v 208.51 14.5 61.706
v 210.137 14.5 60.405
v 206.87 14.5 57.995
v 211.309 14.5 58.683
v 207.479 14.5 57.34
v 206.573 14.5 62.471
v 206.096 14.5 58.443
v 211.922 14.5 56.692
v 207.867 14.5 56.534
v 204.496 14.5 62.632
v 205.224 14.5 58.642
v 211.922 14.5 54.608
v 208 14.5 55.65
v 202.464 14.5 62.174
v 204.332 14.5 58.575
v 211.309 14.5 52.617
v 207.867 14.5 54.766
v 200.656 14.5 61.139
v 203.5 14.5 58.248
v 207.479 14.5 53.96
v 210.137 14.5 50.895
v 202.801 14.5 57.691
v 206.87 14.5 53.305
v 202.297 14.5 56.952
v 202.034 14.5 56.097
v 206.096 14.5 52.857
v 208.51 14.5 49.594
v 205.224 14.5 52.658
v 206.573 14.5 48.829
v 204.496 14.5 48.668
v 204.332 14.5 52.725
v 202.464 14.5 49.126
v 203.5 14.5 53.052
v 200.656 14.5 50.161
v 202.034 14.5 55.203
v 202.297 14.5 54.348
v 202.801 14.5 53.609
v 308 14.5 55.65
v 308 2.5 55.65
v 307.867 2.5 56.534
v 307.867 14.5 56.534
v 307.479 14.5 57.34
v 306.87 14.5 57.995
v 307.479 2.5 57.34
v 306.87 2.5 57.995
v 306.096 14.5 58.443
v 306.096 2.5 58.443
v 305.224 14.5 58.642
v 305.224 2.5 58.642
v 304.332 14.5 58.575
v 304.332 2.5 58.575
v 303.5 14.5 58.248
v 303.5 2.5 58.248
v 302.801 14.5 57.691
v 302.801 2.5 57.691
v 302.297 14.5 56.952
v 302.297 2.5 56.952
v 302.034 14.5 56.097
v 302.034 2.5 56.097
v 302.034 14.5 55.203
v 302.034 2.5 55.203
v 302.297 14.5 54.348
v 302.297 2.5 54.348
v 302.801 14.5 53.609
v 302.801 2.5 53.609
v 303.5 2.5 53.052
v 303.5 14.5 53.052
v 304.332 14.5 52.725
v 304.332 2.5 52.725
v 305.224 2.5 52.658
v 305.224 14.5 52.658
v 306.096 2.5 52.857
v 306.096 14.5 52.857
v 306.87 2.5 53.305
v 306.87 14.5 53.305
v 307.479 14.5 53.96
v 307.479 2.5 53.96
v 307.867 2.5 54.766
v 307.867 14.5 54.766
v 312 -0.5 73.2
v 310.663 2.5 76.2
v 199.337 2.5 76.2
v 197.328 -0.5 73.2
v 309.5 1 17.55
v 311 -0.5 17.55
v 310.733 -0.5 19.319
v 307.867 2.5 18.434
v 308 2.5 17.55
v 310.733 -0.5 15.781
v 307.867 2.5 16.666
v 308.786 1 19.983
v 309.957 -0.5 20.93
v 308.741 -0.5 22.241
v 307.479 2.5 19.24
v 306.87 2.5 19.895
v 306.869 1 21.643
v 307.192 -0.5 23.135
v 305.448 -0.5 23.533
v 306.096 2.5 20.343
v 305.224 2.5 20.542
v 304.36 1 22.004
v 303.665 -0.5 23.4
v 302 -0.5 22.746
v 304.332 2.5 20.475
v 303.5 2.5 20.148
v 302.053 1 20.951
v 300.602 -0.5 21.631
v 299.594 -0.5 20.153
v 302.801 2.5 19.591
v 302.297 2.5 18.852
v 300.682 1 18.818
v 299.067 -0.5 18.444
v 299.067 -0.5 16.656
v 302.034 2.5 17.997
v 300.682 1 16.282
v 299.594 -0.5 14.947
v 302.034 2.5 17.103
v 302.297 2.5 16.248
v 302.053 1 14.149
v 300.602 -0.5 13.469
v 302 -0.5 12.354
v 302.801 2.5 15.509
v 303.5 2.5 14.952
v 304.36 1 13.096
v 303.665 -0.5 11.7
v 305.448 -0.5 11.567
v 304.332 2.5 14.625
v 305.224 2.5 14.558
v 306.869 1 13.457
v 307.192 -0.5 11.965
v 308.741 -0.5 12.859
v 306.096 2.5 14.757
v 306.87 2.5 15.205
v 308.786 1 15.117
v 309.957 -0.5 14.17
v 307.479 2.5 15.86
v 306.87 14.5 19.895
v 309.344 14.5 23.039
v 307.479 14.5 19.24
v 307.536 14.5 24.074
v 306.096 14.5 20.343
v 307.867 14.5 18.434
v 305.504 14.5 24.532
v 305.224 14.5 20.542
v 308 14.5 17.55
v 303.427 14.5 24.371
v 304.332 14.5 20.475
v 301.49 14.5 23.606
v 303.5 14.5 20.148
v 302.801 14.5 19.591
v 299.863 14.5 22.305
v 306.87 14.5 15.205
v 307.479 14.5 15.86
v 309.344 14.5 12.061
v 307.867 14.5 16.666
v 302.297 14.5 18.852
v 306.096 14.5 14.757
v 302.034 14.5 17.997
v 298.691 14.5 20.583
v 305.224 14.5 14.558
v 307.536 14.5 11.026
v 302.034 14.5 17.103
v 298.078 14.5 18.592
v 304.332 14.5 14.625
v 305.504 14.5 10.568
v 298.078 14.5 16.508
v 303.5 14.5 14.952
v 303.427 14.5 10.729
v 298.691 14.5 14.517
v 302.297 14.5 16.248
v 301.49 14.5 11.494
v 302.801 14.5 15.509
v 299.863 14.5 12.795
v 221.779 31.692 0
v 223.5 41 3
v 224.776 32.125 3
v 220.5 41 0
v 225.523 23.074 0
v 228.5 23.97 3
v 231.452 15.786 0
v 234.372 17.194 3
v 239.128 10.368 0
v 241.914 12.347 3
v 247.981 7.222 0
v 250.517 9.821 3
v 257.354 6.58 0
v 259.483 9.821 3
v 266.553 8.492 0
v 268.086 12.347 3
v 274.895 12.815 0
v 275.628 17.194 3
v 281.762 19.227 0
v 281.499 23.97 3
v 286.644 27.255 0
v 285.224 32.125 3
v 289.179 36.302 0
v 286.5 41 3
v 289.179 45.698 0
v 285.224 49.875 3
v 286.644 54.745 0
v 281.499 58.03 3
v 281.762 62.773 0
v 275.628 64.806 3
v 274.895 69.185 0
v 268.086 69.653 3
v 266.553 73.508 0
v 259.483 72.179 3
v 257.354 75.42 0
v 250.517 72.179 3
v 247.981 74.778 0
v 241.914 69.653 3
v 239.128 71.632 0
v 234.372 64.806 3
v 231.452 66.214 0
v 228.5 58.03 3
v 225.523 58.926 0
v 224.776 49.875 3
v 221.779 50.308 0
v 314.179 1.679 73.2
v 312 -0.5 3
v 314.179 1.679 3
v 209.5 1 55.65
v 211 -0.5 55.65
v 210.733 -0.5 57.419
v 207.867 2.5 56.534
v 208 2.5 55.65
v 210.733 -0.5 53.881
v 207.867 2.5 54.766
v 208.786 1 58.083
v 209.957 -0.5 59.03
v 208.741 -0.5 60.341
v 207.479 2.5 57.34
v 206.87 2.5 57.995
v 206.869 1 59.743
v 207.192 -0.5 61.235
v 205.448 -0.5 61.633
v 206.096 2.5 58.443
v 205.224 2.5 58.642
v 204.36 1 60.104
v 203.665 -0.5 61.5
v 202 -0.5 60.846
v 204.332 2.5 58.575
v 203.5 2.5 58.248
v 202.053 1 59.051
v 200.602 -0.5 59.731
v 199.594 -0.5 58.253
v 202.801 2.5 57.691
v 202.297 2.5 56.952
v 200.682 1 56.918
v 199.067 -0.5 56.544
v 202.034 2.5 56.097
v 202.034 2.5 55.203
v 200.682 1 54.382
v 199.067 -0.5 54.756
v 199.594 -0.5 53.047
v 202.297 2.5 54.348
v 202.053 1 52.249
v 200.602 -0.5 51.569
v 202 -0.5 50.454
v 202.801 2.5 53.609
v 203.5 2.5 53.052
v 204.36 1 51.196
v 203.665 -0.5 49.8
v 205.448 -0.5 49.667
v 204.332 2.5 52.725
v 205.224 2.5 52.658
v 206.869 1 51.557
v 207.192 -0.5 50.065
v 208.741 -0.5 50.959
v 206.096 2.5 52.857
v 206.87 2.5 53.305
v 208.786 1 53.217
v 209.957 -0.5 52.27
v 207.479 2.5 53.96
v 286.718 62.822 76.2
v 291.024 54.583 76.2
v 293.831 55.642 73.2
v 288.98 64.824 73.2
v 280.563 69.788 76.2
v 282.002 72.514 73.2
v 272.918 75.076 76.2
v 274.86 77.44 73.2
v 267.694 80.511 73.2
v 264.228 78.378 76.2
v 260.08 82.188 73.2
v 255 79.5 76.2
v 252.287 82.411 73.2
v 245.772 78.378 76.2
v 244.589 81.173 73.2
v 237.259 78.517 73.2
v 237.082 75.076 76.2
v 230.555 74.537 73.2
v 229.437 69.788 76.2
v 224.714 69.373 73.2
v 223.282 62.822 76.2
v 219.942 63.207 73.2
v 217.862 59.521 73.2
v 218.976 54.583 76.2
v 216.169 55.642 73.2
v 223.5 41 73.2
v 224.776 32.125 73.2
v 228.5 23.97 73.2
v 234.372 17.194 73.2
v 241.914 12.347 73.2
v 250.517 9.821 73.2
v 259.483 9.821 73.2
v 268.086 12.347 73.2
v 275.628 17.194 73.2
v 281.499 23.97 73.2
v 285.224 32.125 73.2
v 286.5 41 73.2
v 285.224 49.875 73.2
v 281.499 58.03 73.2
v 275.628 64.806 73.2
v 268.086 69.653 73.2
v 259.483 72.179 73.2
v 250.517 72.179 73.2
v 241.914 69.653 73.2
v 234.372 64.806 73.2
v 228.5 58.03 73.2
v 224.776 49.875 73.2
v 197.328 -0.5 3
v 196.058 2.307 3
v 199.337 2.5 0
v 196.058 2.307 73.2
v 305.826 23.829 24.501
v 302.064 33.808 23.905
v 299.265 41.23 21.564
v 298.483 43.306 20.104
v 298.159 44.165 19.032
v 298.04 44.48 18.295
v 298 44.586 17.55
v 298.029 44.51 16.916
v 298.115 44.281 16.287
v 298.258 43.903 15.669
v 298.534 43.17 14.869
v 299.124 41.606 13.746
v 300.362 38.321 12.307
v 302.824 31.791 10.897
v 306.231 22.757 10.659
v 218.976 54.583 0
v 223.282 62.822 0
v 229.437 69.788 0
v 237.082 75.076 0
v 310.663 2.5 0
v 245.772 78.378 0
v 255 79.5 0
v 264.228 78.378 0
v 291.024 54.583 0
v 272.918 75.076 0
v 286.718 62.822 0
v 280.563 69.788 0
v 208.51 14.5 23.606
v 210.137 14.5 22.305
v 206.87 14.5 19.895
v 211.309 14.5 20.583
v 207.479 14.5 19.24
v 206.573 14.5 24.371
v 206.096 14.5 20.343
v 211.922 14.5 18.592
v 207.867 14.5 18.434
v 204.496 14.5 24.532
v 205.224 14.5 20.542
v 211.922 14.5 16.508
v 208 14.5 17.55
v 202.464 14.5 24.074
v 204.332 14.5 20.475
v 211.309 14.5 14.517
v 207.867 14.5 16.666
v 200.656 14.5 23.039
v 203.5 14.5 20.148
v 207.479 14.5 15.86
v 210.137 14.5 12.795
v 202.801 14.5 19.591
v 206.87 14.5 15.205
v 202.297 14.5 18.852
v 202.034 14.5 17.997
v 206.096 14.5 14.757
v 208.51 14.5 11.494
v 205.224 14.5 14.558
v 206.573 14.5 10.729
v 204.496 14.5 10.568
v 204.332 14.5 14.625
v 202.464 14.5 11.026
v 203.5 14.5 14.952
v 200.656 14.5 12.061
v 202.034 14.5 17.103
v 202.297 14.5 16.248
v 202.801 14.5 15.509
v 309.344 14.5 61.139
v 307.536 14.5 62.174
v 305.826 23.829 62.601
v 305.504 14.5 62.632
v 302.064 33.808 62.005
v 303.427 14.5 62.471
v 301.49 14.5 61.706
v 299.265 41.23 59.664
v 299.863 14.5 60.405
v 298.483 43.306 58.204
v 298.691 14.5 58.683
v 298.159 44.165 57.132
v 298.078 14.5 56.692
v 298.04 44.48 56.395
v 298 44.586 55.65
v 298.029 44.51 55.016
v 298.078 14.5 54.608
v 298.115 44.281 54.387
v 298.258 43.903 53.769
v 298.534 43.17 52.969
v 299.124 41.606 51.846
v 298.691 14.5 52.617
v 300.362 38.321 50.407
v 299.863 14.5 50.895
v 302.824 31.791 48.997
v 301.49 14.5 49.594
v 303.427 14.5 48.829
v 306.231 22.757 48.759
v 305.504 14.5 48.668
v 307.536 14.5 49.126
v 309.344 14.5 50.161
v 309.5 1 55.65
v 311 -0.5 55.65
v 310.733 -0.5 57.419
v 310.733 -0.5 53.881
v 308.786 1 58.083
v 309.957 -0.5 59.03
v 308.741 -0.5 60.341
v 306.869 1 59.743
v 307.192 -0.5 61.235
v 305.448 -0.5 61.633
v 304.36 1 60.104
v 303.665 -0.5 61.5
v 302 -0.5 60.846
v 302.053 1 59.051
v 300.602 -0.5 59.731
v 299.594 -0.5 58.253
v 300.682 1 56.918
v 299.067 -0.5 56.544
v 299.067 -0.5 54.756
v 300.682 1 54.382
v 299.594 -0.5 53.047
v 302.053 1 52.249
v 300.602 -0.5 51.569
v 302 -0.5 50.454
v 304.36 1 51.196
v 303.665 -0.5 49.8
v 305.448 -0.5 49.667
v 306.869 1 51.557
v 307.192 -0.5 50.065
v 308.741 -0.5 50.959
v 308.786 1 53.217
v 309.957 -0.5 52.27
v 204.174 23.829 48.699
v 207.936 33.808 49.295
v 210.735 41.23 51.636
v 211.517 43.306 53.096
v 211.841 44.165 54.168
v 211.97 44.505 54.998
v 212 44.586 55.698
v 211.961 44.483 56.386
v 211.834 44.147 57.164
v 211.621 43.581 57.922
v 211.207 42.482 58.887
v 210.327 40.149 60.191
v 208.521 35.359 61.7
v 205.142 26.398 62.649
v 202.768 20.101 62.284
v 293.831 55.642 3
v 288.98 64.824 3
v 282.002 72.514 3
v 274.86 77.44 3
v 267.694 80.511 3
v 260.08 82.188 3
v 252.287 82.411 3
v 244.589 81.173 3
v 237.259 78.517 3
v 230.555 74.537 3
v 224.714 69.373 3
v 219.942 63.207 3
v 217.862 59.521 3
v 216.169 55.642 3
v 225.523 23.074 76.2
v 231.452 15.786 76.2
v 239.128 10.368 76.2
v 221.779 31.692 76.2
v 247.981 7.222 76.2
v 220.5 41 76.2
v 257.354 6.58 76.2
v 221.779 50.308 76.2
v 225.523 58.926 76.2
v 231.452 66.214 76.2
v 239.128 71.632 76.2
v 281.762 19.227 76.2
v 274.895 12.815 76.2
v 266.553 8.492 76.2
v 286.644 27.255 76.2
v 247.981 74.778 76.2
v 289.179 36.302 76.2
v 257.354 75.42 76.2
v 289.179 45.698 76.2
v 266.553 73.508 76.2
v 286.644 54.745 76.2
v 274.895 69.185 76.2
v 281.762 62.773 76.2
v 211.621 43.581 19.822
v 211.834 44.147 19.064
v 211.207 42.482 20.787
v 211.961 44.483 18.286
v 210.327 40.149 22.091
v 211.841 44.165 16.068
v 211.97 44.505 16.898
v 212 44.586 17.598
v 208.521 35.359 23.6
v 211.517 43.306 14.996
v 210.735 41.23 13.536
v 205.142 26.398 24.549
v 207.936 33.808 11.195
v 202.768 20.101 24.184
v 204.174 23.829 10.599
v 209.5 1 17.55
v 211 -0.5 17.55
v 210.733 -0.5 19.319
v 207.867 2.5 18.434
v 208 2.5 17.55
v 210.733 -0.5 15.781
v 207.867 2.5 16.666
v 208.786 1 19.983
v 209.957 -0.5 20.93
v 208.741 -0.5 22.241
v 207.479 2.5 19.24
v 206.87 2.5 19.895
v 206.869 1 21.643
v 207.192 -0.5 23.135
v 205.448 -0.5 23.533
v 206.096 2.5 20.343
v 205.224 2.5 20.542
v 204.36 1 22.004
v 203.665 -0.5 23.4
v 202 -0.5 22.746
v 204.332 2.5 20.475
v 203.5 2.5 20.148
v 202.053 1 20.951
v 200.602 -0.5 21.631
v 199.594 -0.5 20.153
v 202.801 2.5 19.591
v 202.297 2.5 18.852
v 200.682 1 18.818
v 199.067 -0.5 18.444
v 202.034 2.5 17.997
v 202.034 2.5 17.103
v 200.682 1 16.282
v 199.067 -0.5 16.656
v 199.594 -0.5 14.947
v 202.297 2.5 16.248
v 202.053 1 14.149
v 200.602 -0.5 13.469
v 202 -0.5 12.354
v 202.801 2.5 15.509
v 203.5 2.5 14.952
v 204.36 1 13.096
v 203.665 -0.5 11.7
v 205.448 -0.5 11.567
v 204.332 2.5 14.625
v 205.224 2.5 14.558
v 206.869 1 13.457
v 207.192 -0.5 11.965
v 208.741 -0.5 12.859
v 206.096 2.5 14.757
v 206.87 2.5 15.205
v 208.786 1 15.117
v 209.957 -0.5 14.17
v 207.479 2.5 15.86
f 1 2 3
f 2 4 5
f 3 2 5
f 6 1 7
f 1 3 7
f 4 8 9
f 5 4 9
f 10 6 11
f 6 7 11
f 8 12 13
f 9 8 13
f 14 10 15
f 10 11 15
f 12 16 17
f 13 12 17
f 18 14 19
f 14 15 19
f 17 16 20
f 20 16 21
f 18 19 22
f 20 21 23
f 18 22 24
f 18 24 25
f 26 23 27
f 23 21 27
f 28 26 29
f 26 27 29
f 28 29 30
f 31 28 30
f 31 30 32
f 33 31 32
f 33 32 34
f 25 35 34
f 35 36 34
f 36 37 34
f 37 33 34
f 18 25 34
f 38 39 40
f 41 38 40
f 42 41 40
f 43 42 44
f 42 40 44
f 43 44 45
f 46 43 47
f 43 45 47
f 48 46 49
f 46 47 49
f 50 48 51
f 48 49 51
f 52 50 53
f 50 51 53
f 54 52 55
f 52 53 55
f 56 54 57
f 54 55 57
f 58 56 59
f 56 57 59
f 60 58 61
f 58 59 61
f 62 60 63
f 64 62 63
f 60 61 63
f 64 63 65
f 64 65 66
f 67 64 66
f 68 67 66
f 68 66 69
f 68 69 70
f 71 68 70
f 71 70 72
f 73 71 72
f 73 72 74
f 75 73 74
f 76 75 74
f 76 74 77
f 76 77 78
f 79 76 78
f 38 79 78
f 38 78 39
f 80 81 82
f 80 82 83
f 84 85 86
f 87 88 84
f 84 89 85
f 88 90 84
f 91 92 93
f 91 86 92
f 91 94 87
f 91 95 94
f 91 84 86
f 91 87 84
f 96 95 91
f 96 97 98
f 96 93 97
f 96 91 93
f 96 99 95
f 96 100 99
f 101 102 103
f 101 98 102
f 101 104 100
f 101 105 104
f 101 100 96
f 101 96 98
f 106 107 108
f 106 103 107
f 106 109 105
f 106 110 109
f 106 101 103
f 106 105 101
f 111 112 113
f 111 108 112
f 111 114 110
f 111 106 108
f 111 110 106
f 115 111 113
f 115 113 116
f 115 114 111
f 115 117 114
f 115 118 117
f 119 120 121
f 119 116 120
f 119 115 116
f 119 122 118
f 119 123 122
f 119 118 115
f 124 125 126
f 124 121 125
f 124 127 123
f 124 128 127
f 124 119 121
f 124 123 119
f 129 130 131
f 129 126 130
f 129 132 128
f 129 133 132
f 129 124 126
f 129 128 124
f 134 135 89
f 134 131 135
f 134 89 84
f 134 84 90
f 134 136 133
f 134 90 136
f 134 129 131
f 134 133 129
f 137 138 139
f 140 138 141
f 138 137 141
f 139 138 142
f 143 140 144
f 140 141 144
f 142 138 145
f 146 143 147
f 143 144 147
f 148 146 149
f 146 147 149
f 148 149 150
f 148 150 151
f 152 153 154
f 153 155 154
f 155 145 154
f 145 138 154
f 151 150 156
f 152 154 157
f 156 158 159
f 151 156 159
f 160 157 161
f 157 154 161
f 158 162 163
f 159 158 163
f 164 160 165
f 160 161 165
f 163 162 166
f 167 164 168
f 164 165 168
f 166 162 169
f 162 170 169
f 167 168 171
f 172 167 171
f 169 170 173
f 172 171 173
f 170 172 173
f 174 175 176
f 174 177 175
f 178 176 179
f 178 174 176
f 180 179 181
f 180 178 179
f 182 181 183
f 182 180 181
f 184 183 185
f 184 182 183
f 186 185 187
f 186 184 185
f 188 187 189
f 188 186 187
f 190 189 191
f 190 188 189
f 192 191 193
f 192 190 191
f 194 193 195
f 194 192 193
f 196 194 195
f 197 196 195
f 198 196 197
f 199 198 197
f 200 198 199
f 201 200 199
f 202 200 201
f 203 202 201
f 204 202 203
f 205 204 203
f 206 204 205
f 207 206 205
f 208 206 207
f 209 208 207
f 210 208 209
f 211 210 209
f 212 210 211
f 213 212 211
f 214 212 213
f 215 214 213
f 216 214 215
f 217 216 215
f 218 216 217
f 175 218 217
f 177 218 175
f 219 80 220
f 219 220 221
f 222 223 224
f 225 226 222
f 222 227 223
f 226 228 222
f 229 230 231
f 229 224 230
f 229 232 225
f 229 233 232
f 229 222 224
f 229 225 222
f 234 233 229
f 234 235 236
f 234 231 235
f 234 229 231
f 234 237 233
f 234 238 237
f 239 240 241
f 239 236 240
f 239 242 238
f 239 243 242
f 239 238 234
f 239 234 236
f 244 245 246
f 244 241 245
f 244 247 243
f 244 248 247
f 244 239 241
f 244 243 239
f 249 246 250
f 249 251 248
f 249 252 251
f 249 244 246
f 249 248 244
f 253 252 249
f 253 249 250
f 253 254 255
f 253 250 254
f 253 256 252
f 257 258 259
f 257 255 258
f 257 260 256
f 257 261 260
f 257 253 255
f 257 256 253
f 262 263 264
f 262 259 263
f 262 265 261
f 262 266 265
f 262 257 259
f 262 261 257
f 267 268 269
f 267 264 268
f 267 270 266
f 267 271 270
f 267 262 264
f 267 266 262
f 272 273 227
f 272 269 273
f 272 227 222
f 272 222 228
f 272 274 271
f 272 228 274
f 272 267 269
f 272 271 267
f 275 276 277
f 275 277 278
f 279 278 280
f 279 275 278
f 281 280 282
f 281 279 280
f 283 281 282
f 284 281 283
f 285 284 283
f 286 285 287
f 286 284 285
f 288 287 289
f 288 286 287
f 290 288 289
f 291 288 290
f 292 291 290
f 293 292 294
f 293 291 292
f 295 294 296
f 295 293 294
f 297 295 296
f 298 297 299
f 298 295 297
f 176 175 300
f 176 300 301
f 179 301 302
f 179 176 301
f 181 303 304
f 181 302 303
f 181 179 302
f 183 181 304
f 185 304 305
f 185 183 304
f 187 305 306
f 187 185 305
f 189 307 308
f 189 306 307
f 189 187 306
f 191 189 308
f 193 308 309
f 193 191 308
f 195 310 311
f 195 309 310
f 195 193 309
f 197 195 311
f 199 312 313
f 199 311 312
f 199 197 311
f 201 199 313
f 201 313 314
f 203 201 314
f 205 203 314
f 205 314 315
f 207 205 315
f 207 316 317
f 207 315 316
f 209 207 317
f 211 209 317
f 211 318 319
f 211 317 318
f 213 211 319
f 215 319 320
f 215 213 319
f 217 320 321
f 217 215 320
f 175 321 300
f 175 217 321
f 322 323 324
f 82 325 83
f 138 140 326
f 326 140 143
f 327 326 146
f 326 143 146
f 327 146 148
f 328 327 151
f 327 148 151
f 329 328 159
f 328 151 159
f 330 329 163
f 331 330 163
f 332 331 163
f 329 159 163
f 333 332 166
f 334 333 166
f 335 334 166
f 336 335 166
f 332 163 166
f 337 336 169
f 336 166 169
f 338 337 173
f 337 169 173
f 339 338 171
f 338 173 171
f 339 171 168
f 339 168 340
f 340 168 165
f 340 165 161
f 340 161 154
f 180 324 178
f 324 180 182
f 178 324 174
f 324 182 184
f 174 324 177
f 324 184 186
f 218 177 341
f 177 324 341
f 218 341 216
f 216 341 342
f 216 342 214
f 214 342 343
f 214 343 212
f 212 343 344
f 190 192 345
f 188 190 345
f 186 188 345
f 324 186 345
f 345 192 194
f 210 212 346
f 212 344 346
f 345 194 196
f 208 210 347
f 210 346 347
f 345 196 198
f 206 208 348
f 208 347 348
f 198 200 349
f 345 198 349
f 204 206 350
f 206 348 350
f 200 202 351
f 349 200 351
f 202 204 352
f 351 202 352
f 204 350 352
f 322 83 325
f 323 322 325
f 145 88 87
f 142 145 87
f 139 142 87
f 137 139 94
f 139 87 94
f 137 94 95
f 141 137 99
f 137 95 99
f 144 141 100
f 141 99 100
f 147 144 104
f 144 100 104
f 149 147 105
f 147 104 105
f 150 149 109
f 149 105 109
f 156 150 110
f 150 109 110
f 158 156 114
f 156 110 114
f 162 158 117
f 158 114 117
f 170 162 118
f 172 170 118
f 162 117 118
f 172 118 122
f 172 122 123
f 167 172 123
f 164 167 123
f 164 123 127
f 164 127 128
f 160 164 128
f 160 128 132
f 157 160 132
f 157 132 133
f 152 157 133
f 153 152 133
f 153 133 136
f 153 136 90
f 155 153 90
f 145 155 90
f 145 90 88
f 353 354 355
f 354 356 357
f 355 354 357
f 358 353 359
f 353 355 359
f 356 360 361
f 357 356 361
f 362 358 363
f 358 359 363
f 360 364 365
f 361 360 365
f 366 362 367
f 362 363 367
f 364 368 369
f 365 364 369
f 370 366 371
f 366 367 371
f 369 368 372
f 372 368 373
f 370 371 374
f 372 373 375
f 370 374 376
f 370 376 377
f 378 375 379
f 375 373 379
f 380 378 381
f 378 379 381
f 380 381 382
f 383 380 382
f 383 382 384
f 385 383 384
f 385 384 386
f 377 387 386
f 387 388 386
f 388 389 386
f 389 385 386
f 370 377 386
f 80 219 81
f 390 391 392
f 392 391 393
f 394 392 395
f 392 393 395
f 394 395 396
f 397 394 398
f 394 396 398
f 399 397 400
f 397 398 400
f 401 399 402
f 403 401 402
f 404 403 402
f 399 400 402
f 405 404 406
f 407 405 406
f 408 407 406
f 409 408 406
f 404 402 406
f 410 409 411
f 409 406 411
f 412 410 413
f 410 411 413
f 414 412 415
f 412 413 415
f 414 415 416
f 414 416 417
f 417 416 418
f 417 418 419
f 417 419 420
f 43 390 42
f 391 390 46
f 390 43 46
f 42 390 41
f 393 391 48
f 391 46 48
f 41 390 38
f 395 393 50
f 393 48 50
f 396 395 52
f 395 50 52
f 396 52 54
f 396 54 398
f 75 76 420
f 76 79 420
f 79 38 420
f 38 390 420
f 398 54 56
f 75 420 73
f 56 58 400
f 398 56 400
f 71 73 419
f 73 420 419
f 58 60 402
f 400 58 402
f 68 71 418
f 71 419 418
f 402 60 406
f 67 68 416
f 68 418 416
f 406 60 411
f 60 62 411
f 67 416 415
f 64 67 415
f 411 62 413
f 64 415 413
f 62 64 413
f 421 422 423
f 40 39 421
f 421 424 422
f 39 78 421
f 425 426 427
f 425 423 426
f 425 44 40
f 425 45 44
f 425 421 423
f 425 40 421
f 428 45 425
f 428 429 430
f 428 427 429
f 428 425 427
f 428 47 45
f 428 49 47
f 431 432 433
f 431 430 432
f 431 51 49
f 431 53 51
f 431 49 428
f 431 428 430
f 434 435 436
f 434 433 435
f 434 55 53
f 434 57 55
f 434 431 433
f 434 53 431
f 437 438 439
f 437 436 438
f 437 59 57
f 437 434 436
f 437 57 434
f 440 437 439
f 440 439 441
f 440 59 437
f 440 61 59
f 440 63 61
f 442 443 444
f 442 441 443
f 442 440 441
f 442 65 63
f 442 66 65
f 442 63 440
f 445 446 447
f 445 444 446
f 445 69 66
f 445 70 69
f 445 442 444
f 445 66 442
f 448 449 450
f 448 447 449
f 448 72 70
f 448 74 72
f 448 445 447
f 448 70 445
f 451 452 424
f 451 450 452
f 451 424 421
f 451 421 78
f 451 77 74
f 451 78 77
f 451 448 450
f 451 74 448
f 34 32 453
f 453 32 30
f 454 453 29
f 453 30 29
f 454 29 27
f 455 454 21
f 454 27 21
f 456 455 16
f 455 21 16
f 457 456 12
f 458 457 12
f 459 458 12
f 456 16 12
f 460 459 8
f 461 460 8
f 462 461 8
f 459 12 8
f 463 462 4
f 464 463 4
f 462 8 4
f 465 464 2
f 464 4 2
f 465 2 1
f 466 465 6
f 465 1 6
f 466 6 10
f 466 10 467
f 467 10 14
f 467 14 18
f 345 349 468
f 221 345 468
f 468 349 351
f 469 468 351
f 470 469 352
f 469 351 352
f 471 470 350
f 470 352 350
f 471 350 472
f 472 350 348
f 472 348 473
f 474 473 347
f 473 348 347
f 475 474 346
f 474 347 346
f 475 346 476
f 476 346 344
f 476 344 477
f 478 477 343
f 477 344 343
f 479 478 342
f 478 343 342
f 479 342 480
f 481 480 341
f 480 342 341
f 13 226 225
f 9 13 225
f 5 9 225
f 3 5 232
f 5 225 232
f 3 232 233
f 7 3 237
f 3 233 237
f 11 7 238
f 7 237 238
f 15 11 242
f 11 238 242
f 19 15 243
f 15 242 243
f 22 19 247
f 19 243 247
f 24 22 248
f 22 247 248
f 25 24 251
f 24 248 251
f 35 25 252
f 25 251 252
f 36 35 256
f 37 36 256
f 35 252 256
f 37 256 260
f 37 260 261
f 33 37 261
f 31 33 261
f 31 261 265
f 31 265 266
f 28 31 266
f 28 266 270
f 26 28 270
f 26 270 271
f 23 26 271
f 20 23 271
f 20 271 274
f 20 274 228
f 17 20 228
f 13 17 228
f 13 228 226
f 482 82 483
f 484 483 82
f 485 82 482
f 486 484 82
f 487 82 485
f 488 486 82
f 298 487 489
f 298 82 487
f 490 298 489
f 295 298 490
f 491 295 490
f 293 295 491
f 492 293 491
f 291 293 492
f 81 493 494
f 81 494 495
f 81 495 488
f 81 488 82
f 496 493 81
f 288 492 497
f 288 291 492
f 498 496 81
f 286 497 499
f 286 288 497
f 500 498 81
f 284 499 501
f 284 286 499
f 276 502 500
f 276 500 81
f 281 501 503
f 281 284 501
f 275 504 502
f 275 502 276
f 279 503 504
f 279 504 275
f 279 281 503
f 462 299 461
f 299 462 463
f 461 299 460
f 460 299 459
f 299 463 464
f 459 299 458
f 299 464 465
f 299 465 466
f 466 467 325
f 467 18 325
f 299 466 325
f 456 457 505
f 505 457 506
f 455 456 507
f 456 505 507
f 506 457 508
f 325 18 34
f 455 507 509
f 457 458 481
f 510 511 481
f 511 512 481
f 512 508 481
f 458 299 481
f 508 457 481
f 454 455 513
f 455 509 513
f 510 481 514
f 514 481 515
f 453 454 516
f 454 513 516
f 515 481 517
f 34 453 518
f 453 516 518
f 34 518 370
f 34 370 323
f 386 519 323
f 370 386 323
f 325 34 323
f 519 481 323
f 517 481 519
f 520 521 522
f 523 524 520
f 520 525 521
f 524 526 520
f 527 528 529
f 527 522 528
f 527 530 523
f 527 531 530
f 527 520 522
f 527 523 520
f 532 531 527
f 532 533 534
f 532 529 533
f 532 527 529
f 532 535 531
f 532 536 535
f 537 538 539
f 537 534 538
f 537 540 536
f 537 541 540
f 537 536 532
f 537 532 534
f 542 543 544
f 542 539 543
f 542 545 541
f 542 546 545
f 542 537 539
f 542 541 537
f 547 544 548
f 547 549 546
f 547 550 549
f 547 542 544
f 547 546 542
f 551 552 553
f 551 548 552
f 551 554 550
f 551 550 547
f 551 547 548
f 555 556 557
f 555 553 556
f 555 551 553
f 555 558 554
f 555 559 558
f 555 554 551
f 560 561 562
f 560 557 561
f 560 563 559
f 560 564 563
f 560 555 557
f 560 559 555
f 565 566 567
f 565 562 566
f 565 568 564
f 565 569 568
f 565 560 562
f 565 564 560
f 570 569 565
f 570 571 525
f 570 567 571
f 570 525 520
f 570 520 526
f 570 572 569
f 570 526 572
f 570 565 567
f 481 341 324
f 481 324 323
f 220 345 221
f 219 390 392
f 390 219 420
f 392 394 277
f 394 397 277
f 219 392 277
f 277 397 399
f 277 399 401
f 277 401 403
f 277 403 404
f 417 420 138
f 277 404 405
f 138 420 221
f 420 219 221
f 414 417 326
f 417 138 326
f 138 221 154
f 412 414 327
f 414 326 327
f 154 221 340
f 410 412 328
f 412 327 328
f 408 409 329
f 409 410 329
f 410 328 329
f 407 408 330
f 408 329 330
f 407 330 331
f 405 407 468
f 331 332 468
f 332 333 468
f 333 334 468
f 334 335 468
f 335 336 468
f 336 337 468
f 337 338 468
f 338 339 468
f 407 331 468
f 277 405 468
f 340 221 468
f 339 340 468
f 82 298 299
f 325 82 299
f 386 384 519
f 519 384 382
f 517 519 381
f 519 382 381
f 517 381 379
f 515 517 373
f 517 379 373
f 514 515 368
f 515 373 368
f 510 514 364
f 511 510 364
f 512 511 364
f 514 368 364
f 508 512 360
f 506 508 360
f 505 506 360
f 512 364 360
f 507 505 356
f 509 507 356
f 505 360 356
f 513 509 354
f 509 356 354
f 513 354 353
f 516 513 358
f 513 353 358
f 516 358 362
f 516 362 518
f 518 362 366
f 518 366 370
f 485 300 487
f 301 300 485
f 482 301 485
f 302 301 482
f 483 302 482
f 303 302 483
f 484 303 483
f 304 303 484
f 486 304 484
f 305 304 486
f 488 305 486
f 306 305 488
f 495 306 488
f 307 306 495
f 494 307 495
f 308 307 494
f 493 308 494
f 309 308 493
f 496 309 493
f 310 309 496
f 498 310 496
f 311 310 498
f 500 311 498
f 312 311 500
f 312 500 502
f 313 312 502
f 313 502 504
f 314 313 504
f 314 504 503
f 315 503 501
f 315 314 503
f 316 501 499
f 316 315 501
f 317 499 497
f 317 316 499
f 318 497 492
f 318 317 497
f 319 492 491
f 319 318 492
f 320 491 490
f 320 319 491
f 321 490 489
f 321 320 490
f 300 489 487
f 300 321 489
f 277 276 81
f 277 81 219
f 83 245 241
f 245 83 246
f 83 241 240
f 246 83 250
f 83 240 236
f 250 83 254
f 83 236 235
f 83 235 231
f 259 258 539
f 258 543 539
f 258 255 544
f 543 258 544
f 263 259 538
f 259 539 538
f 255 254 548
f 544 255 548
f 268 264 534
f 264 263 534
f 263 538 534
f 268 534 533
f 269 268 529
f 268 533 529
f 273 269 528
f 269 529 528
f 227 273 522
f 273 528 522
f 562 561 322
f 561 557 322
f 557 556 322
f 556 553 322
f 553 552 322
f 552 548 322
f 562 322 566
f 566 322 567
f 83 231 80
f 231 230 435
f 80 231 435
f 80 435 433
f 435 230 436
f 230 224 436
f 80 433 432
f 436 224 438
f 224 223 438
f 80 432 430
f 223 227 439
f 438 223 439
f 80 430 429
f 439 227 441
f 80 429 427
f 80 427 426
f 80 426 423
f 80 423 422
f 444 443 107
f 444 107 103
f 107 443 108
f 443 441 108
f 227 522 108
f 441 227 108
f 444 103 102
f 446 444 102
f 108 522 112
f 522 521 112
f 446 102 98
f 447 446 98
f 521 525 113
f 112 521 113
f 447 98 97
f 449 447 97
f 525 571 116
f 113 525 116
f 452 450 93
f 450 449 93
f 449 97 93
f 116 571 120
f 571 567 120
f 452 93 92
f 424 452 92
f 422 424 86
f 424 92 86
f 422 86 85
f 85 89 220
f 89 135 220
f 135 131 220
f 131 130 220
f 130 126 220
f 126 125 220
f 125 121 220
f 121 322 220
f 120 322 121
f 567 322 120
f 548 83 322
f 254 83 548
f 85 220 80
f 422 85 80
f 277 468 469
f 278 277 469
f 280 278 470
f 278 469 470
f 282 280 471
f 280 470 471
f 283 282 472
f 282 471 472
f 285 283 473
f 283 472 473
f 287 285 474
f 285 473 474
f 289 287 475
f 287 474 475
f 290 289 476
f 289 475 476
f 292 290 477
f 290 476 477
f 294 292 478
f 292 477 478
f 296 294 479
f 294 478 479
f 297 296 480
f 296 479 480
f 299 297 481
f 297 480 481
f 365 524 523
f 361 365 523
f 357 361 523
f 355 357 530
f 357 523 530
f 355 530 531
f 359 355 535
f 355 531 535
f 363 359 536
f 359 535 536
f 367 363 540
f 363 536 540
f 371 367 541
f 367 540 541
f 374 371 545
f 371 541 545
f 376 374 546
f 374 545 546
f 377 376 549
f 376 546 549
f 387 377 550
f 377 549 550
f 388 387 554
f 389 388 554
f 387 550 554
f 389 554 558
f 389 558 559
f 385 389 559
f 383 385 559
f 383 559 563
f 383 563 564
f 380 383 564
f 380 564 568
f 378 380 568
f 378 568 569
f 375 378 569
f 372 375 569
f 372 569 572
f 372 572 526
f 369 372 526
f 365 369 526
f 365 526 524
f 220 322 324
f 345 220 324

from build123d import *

# Parameters (mm, degrees)
SKETCH1_R           = 31.500002617
BOSS_EXTRUDE1_DEPTH = 76.2
SKETCH2_R           = 3
CUT_EXTRUDE1_DEPTH  = 335.545125332
SKETCH3_R           = 7
CUT_EXTRUDE2_DEPTH  = 332.142628978


with BuildPart() as part:
    # Sketch1 → Boss-Extrude1 (new body)
    with BuildSketch(Plane.XY):
        with BuildLine():
            Line((254.999981536, -0.500000028), (315.000000023, -0.500000028))
            Line((315.000000023, -0.500000028), (293.831301967, 55.641681824))
            ThreePointArc((293.831301967, 55.641681824), (254.99996624, 82.500005207), (216.168650312, 55.6416532))
            Line((216.168650312, 55.6416532), (195.000010316, -0.500000028))
            Line((195.000010316, -0.500000028), (254.999981536, -0.500000028))
        make_face()
        with Locations(Location((254.999981536, 41.00000259, 0), (0, 0, 180))):
            Circle(SKETCH1_R, mode=Mode.SUBTRACT)
    extrude(amount=BOSS_EXTRUDE1_DEPTH)

    # Sketch2 → Cut-Extrude1 (cut, through all)
    with BuildSketch(Plane.XZ.offset(0.500000028)):
        with Locations((205.000010316, 55.65)):
            Circle(SKETCH2_R)
        with Locations((205.000010316, 17.55)):
            Circle(SKETCH2_R)
        with Locations((305.000000023, 17.55)):
            Circle(SKETCH2_R)
        with Locations((305.000000023, 55.65)):
            Circle(SKETCH2_R)
    extrude(amount=-CUT_EXTRUDE1_DEPTH, mode=Mode.SUBTRACT)

    # Sketch3 → Cut-Extrude2 (cut, through all)
    with BuildSketch(Plane(origin=(0, 14.499999972, 0), x_dir=(-1, 0, 0), z_dir=(0, -1, 0))):
        with Locations((-205.000010316, -55.65)):
            Circle(SKETCH3_R)
        with Locations((-205.000010316, -17.55)):
            Circle(SKETCH3_R)
        with Locations((-305.000000023, -17.55)):
            Circle(SKETCH3_R)
        with Locations((-305.000000023, -55.65)):
            Circle(SKETCH3_R)
    extrude(amount=-CUT_EXTRUDE2_DEPTH, mode=Mode.SUBTRACT)

    # Chamfer1
    # the kernel refuses this chamfer: 3, 2.32827876, 2.328277984 mm, written as the material it takes off along each edge
    with BuildSketch(Plane(origin=(312.2804021, 1.226185537, 2), x_dir=(0.7489750456743214, -0.1749877092594348, 0.6390740822199596), z_dir=(0.49445065392204135, -0.49445065392203297, -0.7148685904920845))) as chamfer1_piece_1:
        Polygon((-2.712706316, -0.938589866), (1.981585134, -0.938589866), (0.731121181, 1.877179732), align=None)
    extrude(amount=3.990753507, mode=Mode.SUBTRACT)
    with BuildSketch(Plane(origin=(312.2804021, 1.226185537, 74.2), x_dir=(0.7489750456743212, -0.17498770925943466, -0.6390740822199599), z_dir=(0.49445065392204157, -0.4944506539220329, 0.7148685904920844))) as chamfer1_piece_2:
        Polygon((-2.712706316, 0.938589866), (1.981585134, 0.938589866), (0.731121181, -1.877179732), align=None)
    extrude(amount=3.990753507, mode=Mode.SUBTRACT)
    with BuildSketch(Plane(origin=(197.57469642, 1.435694642, 2), x_dir=(-0.7370953833685595, -0.043367244138400055, 0.6743957873182457), z_dir=(-0.6371026460751021, -0.2882074086415896, -0.7148683151239834))) as chamfer1_piece_3:
        Polygon((-2.694196805, 0.990466053), (1.754229559, 0.990466053), (0.939967246, -1.980932106), align=None)
    extrude(amount=3.990753255, mode=Mode.SUBTRACT)
    with BuildSketch(Plane(origin=(197.57469642, 1.435694642, 74.2), x_dir=(0.4121611112794653, -0.9111109802591978, 0), z_dir=(-0.637102646075102, -0.2882074086415896, 0.7148683151239834))) as chamfer1_piece_4:
        Polygon((-1.418873162, -1.430085067), (1.662073143, -1.430085067), (-0.243199981, 2.860170134), align=None)
    extrude(amount=3.990753255, mode=Mode.SUBTRACT)
    with BuildSketch(Plane(origin=(315.000000023, -0.500000028, -7.715048964), x_dir=(-0.9996219169112968, -0.027495876610586858, 0), z_dir=(0, 0, 1))) as chamfer1_piece_5:
        with BuildLine():
            Line((3.086019586, 0), (0.674077573, -2.282806951))
            Line((0.674077573, -2.282806951), (0.617375083, -2.302423975))
            ThreePointArc((0.617375083, -2.302423975), (0.331998575, -1.143147207), (-0.05670249, -0.019617024))
            Line((-0.05670249, -0.019617024), (0.001649753, 0.059977315))
            ThreePointArc((0.001649753, 0.059977315), (1.543492994, 0.017566949), (3.087669338, 0.059977315))
            Line((3.087669338, 0.059977315), (3.086019586, 0))
        make_face()
    extrude(amount=91.630097928, mode=Mode.SUBTRACT)
    with BuildSketch(Plane(origin=(195.000010316, -0.500000028, -7.715048964), x_dir=(0.9989444981358719, -0.04593353507048098, 0), z_dir=(0, 0, 1))) as chamfer1_piece_6:
        with BuildLine():
            Line((2.380250452, 0), (0.873946844, 2.959684746))
            Line((0.873946844, 2.959684746), (0.81689207, 2.978252267))
            ThreePointArc((0.81689207, 2.978252267), (0.420262466, 1.485280674), (-0.057054773, 0.018567521))
            Line((-0.057054773, 0.018567521), (0.002756012, -0.05993667))
            ThreePointArc((0.002756012, -0.05993667), (1.190370205, -0.005327712), (2.383006464, -0.05993667))
            Line((2.383006464, -0.05993667), (2.380250452, 0))
        make_face()
    extrude(amount=91.630097928, mode=Mode.SUBTRACT)
    with BuildSketch(Plane(origin=(317.721958218, -7.71892821, 76.2), x_dir=(-0.9353406389810182, -0.3526781334871724, 0.027495876610586882), z_dir=(-0.3528115255584857, 0.9356944092133361, 0))) as chamfer1_piece_7:
        with BuildLine():
            Line((3.086019586, 0), (-0.169641465, -3.081353381))
            Line((-0.169641465, -3.081353381), (-0.22961878, -3.079703628))
            ThreePointArc((-0.22961878, -3.079703628), (-0.102387681, -1.540193489), (-0.059977315, 0.001649753))
            Line((-0.059977315, 0.001649753), (0.001649753, 0.059977315))
            ThreePointArc((0.001649753, 0.059977315), (1.543492994, 0.017566949), (3.087669338, 0.059977315))
            Line((3.087669338, 0.059977315), (3.086019586, 0))
        make_face()
    extrude(amount=67.715067451, mode=Mode.SUBTRACT)
    with BuildSketch(Plane(origin=(254.999981536, 41.00000259, 76.2), x_dir=(0.9356944092133357, 0.3528115255584864, 0), z_dir=(0.3528115255584864, -0.9356944092133357, 0))) as chamfer1_piece_8:
        with BuildLine():
            Line((41.584855431, -3.084852814), (38.415149803, 0.084852814))
            Line((38.415149803, 0.084852814), (38.415149803, 0.144852814))
            ThreePointArc((38.415149803, 0.144852814), (39.95757621, 0.06), (41.500002617, 0.06))
            Line((41.500002617, 0.06), (41.560002617, 0))
            ThreePointArc((41.560002617, 0), (41.560002617, -1.542426407), (41.644855431, -3.084852814))
            Line((41.644855431, -3.084852814), (41.584855431, -3.084852814))
        make_face()
    revolve(axis=Axis((254.999981536, 41.00000259, 76.2), (0, 0, 1)), revolution_arc=138.681287603, mode=Mode.SUBTRACT)
    with BuildSketch(Plane(origin=(216.168650312, 55.6416532, 76.2), x_dir=(0.9353408989512485, -0.3526774440171723, 0.027495876610586775), z_dir=(-0.35281083582771006, -0.9356946692818939, 0))) as chamfer1_piece_9:
        with BuildLine():
            Line((3.086019586, 0), (-0.169641465, -3.081353381))
            Line((-0.169641465, -3.081353381), (-0.22961878, -3.079703628))
            ThreePointArc((-0.22961878, -3.079703628), (-0.102387681, -1.540193489), (-0.059977315, 0.001649753))
            Line((-0.059977315, 0.001649753), (0.001649753, 0.059977315))
            ThreePointArc((0.001649753, 0.059977315), (1.543492994, 0.017566949), (3.087669338, 0.059977315))
            Line((3.087669338, 0.059977315), (3.086019586, 0))
        make_face()
    extrude(amount=67.715020184, mode=Mode.SUBTRACT)
    with BuildSketch(Plane(origin=(305.000000023, -0.500000028, 55.65), x_dir=(1, 0, 0), z_dir=(0, 0, -1))) as chamfer1_piece_10:
        with BuildLine():
            Line((6.084852814, 0.084852814), (2.915147186, -3.084852814))
            Line((2.915147186, -3.084852814), (2.855147186, -3.084852814))
            ThreePointArc((2.855147186, -3.084852814), (2.94, -1.542426407), (2.94, 0))
            Line((2.94, 0), (3, 0.06))
            ThreePointArc((3, 0.06), (4.542426407, 0.06), (6.084852814, 0.144852814))
            Line((6.084852814, 0.144852814), (6.084852814, 0.084852814))
        make_face()
    revolve(axis=Axis((305.000000023, -0.500000028, 55.65), (0, -1, 0)), mode=Mode.SUBTRACT)
    with BuildSketch(Plane(origin=(305.000000023, -0.500000028, 17.55), x_dir=(1, 0, 0), z_dir=(0, 0, -1))) as chamfer1_piece_11:
        with BuildLine():
            Line((6.084852814, 0.084852814), (2.915147186, -3.084852814))
            Line((2.915147186, -3.084852814), (2.855147186, -3.084852814))
            ThreePointArc((2.855147186, -3.084852814), (2.94, -1.542426407), (2.94, 0))
            Line((2.94, 0), (3, 0.06))
            ThreePointArc((3, 0.06), (4.542426407, 0.06), (6.084852814, 0.144852814))
            Line((6.084852814, 0.144852814), (6.084852814, 0.084852814))
        make_face()
    revolve(axis=Axis((305.000000023, -0.500000028, 17.55), (0, -1, 0)), mode=Mode.SUBTRACT)
    with BuildSketch(Plane(origin=(322.715048987, -0.500000028, 76.2), x_dir=(0, 0.9996219169112968, 0.027495876610586778), z_dir=(-1, 0, 0))) as chamfer1_piece_12:
        with BuildLine():
            Line((3.086019586, 0), (-0.169641465, 3.081353381))
            Line((-0.169641465, 3.081353381), (-0.22961878, 3.079703628))
            ThreePointArc((-0.22961878, 3.079703628), (-0.102387681, 1.540193489), (-0.059977315, -0.001649753))
            Line((-0.059977315, -0.001649753), (0.001649753, -0.059977315))
            ThreePointArc((0.001649753, -0.059977315), (1.543492994, -0.017566949), (3.087669338, -0.059977315))
            Line((3.087669338, -0.059977315), (3.086019586, 0))
        make_face()
    extrude(amount=135.430087635, mode=Mode.SUBTRACT)
    with BuildSketch(Plane(origin=(205.000010316, -0.500000028, 17.55), x_dir=(1, 0, 0), z_dir=(0, 0, -1))) as chamfer1_piece_13:
        with BuildLine():
            Line((6.084852814, 0.084852814), (2.915147186, -3.084852814))
            Line((2.915147186, -3.084852814), (2.855147186, -3.084852814))
            ThreePointArc((2.855147186, -3.084852814), (2.94, -1.542426407), (2.94, 0))
            Line((2.94, 0), (3, 0.06))
            ThreePointArc((3, 0.06), (4.542426407, 0.06), (6.084852814, 0.144852814))
            Line((6.084852814, 0.144852814), (6.084852814, 0.084852814))
        make_face()
    revolve(axis=Axis((205.000010316, -0.500000028, 17.55), (0, -1, 0)), mode=Mode.SUBTRACT)
    with BuildSketch(Plane(origin=(205.000010316, -0.500000028, 55.65), x_dir=(1, 0, 0), z_dir=(0, 0, -1))) as chamfer1_piece_14:
        with BuildLine():
            Line((6.084852814, 0.084852814), (2.915147186, -3.084852814))
            Line((2.915147186, -3.084852814), (2.855147186, -3.084852814))
            ThreePointArc((2.855147186, -3.084852814), (2.94, -1.542426407), (2.94, 0))
            Line((2.94, 0), (3, 0.06))
            ThreePointArc((3, 0.06), (4.542426407, 0.06), (6.084852814, 0.144852814))
            Line((6.084852814, 0.144852814), (6.084852814, 0.084852814))
        make_face()
    revolve(axis=Axis((205.000010316, -0.500000028, 55.65), (0, -1, 0)), mode=Mode.SUBTRACT)
    with BuildSketch(Plane(origin=(254.999981536, 41.00000259, 76.2), x_dir=(-1, 0, 0), z_dir=(0, 1, 0))) as chamfer1_piece_15:
        with BuildLine():
            Line((34.584855431, 0.084852814), (31.415149803, -3.084852814))
            Line((31.415149803, -3.084852814), (31.355149803, -3.084852814))
            ThreePointArc((31.355149803, -3.084852814), (31.440002617, -1.542426407), (31.440002617, 0))
            Line((31.440002617, 0), (31.500002617, 0.06))
            ThreePointArc((31.500002617, 0.06), (33.042429024, 0.06), (34.584855431, 0.144852814))
            Line((34.584855431, 0.144852814), (34.584855431, 0.084852814))
        make_face()
    revolve(axis=Axis((254.999981536, 41.00000259, 76.2), (0, 0, 1)), mode=Mode.SUBTRACT)
    with BuildSketch(Plane(origin=(187.284961352, -0.500000028, 0), x_dir=(0, -0.027495876610586382, 0.9996219169112968), z_dir=(1, 0, 0))) as chamfer1_piece_16:
        with BuildLine():
            Line((3.086019586, 0), (-0.169641465, -3.081353381))
            Line((-0.169641465, -3.081353381), (-0.22961878, -3.079703628))
            ThreePointArc((-0.22961878, -3.079703628), (-0.102387681, -1.540193489), (-0.059977315, 0.001649753))
            Line((-0.059977315, 0.001649753), (0.001649753, 0.059977315))
            ThreePointArc((0.001649753, 0.059977315), (1.543492994, 0.017566949), (3.087669338, 0.059977315))
            Line((3.087669338, 0.059977315), (3.086019586, 0))
        make_face()
    extrude(amount=135.430087635, mode=Mode.SUBTRACT)
    with BuildSketch(Plane(origin=(216.168650312, 55.6416532, 0), x_dir=(0.9353408989512486, -0.3526774440171724, -0.027495876610586396), z_dir=(-0.35281083582771006, -0.9356946692818939, 0))) as chamfer1_piece_17:
        with BuildLine():
            Line((3.086019586, 0), (-0.169641465, 3.081353381))
            Line((-0.169641465, 3.081353381), (-0.22961878, 3.079703628))
            ThreePointArc((-0.22961878, 3.079703628), (-0.102387681, 1.540193489), (-0.059977315, -0.001649753))
            Line((-0.059977315, -0.001649753), (0.001649753, -0.059977315))
            ThreePointArc((0.001649753, -0.059977315), (1.543492994, -0.017566949), (3.087669338, -0.059977315))
            Line((3.087669338, -0.059977315), (3.086019586, 0))
        make_face()
    extrude(amount=67.715020184, mode=Mode.SUBTRACT)
    with BuildSketch(Plane(origin=(254.999981536, 41.00000259, 0), x_dir=(0.9356944092133357, 0.3528115255584864, 0), z_dir=(0.3528115255584864, -0.9356944092133357, 0))) as chamfer1_piece_18:
        with BuildLine():
            Line((41.584855431, 3.084852814), (38.415149803, -0.084852814))
            Line((38.415149803, -0.084852814), (38.415149803, -0.144852814))
            ThreePointArc((38.415149803, -0.144852814), (39.95757621, -0.06), (41.500002617, -0.06))
            Line((41.500002617, -0.06), (41.560002617, 0))
            ThreePointArc((41.560002617, 0), (41.560002617, 1.542426407), (41.644855431, 3.084852814))
            Line((41.644855431, 3.084852814), (41.584855431, 3.084852814))
        make_face()
    revolve(axis=Axis((254.999981536, 41.00000259, 0), (0, 0, 1)), revolution_arc=138.681287603, mode=Mode.SUBTRACT)
    with BuildSketch(Plane(origin=(317.721958218, -7.71892821, 0), x_dir=(-0.9353406389810183, -0.3526781334871725, -0.02749587661058642), z_dir=(-0.3528115255584857, 0.9356944092133361, 0))) as chamfer1_piece_19:
        with BuildLine():
            Line((3.086019586, 0), (-0.169641465, 3.081353381))
            Line((-0.169641465, 3.081353381), (-0.22961878, 3.079703628))
            ThreePointArc((-0.22961878, 3.079703628), (-0.102387681, 1.540193489), (-0.059977315, -0.001649753))
            Line((-0.059977315, -0.001649753), (0.001649753, -0.059977315))
            ThreePointArc((0.001649753, -0.059977315), (1.543492994, -0.017566949), (3.087669338, -0.059977315))
            Line((3.087669338, -0.059977315), (3.086019586, 0))
        make_face()
    extrude(amount=67.715067451, mode=Mode.SUBTRACT)
    with BuildSketch(Plane(origin=(254.999981536, 41.00000259, 0), x_dir=(-1, 0, 0), z_dir=(0, 1, 0))) as chamfer1_piece_20:
        with BuildLine():
            Line((31.415149803, 3.084852814), (34.584855431, -0.084852814))
            Line((34.584855431, -0.084852814), (34.584855431, -0.144852814))
            ThreePointArc((34.584855431, -0.144852814), (33.042429024, -0.06), (31.500002617, -0.06))
            Line((31.500002617, -0.06), (31.440002617, 0))
            ThreePointArc((31.440002617, 0), (31.440002617, 1.542426407), (31.355149803, 3.084852814))
            Line((31.355149803, 3.084852814), (31.415149803, 3.084852814))
        make_face()
    revolve(axis=Axis((254.999981536, 41.00000259, 0), (0, 0, 1)), mode=Mode.SUBTRACT)


solid = part.part
